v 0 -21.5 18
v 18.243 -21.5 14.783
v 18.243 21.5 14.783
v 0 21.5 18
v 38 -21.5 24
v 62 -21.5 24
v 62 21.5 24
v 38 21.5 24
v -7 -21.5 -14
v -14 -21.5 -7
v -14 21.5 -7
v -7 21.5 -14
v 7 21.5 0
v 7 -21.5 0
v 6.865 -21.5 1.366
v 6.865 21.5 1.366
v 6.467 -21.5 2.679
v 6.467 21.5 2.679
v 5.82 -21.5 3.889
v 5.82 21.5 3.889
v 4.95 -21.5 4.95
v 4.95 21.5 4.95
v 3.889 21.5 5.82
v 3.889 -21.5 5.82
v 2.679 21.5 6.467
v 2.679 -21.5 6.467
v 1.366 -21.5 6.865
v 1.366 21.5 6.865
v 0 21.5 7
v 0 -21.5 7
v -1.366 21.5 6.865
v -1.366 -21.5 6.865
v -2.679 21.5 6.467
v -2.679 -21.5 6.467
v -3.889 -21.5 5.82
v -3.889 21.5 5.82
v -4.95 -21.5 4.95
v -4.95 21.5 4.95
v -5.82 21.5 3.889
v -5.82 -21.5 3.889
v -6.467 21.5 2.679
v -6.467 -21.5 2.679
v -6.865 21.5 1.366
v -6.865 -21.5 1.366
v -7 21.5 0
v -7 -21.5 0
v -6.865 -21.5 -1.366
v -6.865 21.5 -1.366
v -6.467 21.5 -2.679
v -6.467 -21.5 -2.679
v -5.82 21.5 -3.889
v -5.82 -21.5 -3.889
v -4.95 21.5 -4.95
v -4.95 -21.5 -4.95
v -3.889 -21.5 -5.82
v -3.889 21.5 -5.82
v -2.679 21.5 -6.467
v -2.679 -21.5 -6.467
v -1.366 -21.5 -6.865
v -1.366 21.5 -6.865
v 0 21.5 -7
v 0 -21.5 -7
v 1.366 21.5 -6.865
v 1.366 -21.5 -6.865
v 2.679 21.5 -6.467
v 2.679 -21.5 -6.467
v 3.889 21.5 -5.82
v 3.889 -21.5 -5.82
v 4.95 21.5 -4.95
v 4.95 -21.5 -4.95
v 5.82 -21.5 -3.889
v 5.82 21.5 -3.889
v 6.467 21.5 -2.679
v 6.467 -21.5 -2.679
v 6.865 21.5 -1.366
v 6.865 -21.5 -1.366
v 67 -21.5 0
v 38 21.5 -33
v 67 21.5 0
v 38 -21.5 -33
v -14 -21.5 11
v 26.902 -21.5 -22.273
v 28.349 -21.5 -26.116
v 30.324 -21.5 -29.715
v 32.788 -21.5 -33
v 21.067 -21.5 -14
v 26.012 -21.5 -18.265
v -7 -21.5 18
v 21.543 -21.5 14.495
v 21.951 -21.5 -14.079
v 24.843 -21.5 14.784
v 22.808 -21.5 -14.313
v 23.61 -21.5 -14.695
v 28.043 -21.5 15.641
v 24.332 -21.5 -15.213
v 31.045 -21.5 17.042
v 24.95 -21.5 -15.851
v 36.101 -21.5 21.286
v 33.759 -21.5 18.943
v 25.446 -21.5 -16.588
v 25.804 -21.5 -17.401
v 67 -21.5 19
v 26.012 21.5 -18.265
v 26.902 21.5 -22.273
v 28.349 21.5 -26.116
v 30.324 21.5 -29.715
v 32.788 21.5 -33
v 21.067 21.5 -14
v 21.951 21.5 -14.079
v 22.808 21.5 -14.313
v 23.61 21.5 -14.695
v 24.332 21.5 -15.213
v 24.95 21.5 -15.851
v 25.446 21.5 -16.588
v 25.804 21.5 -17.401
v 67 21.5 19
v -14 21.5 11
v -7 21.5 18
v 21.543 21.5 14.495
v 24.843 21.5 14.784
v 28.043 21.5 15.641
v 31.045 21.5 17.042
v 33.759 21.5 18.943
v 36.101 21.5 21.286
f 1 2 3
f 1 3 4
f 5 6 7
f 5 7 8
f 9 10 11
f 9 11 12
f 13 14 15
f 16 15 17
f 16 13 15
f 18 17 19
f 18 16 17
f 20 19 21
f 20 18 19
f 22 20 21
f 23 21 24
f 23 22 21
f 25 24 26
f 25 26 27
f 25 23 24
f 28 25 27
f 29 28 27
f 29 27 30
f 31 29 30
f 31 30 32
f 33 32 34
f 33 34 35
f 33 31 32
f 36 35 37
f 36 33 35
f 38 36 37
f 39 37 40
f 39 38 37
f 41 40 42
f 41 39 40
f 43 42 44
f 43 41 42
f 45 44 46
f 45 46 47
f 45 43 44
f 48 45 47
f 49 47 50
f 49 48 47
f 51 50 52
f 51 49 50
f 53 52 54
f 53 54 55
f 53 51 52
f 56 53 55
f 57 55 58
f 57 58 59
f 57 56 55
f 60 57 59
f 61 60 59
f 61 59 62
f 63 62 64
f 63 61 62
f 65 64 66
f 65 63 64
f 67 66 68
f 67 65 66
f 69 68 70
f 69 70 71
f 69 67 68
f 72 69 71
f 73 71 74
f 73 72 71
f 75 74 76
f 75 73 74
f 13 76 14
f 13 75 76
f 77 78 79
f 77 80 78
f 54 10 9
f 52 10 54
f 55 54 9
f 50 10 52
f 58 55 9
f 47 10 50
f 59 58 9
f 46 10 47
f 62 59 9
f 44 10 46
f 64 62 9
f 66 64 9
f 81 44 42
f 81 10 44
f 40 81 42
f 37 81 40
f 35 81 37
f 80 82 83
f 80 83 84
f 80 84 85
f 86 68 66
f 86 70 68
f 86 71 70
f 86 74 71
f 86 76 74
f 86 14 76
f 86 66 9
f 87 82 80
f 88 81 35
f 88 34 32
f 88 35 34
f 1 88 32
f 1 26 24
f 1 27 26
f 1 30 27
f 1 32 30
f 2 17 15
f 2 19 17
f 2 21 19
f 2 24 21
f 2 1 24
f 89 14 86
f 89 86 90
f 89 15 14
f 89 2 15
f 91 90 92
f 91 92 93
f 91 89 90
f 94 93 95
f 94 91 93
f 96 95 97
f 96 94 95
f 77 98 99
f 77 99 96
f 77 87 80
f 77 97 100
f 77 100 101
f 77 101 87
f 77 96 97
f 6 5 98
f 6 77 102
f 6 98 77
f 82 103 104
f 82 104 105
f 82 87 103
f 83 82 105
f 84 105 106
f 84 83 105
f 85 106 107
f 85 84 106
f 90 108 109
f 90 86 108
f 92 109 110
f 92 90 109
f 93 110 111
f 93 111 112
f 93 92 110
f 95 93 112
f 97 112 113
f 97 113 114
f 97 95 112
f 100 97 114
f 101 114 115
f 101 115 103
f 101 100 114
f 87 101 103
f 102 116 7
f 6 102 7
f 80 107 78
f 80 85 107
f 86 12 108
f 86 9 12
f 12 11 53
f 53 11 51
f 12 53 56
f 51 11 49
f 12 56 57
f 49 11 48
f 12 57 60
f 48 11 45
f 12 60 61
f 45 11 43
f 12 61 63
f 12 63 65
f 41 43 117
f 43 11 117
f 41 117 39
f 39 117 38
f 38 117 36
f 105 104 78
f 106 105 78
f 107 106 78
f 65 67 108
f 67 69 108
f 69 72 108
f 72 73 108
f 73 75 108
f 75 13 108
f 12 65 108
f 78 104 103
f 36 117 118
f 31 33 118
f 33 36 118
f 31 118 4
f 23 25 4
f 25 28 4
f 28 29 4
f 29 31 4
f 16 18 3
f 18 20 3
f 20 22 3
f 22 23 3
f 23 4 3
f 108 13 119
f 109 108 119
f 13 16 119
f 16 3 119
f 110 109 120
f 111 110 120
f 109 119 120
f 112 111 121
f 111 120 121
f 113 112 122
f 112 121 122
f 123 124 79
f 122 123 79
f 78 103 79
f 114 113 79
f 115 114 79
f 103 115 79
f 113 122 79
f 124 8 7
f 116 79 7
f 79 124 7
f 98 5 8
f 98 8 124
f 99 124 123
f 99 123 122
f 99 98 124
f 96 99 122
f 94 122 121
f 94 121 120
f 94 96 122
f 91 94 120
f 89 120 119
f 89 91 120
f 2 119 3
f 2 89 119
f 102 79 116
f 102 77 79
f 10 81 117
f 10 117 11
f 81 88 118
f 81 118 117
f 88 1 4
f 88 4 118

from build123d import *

# Parameters (mm, degrees)
F0_R     = 7
F1_DEPTH = 21.5


with BuildPart() as f1:
    # F0 (on Front) → F1 (new body, symmetric)
    with BuildSketch(Plane.XZ):
        with BuildLine():
            Line((67, 19), (62, 24))
            Line((62, 24), (38, 24))
            ThreePointArc((38, 24), (29.574973, 16.276069), (18.243085, 14.783252))
            Line((18.243085, 14.783252), (0, 18))
            Line((0, 18), (-7, 18))
            Line((-7, 18), (-14, 11))
            Line((-14, 11), (-14, -7))
            Line((-14, -7), (-7, -14))
            Line((-7, -14), (21.066626, -14))
            ThreePointArc((21.066626, -14), (24.331862, -15.213414), (26.012265, -18.264706))
            ThreePointArc((26.012265, -18.264706), (28.349095, -26.115672), (32.788067, -33))
            Line((32.788067, -33), (38, -33))
            Line((38, -33), (67, 0))
            Line((67, 0), (67, 19))
        make_face()
        Circle(F0_R, mode=Mode.SUBTRACT)
    extrude(amount=F1_DEPTH, both=True)


solid = f1.part
